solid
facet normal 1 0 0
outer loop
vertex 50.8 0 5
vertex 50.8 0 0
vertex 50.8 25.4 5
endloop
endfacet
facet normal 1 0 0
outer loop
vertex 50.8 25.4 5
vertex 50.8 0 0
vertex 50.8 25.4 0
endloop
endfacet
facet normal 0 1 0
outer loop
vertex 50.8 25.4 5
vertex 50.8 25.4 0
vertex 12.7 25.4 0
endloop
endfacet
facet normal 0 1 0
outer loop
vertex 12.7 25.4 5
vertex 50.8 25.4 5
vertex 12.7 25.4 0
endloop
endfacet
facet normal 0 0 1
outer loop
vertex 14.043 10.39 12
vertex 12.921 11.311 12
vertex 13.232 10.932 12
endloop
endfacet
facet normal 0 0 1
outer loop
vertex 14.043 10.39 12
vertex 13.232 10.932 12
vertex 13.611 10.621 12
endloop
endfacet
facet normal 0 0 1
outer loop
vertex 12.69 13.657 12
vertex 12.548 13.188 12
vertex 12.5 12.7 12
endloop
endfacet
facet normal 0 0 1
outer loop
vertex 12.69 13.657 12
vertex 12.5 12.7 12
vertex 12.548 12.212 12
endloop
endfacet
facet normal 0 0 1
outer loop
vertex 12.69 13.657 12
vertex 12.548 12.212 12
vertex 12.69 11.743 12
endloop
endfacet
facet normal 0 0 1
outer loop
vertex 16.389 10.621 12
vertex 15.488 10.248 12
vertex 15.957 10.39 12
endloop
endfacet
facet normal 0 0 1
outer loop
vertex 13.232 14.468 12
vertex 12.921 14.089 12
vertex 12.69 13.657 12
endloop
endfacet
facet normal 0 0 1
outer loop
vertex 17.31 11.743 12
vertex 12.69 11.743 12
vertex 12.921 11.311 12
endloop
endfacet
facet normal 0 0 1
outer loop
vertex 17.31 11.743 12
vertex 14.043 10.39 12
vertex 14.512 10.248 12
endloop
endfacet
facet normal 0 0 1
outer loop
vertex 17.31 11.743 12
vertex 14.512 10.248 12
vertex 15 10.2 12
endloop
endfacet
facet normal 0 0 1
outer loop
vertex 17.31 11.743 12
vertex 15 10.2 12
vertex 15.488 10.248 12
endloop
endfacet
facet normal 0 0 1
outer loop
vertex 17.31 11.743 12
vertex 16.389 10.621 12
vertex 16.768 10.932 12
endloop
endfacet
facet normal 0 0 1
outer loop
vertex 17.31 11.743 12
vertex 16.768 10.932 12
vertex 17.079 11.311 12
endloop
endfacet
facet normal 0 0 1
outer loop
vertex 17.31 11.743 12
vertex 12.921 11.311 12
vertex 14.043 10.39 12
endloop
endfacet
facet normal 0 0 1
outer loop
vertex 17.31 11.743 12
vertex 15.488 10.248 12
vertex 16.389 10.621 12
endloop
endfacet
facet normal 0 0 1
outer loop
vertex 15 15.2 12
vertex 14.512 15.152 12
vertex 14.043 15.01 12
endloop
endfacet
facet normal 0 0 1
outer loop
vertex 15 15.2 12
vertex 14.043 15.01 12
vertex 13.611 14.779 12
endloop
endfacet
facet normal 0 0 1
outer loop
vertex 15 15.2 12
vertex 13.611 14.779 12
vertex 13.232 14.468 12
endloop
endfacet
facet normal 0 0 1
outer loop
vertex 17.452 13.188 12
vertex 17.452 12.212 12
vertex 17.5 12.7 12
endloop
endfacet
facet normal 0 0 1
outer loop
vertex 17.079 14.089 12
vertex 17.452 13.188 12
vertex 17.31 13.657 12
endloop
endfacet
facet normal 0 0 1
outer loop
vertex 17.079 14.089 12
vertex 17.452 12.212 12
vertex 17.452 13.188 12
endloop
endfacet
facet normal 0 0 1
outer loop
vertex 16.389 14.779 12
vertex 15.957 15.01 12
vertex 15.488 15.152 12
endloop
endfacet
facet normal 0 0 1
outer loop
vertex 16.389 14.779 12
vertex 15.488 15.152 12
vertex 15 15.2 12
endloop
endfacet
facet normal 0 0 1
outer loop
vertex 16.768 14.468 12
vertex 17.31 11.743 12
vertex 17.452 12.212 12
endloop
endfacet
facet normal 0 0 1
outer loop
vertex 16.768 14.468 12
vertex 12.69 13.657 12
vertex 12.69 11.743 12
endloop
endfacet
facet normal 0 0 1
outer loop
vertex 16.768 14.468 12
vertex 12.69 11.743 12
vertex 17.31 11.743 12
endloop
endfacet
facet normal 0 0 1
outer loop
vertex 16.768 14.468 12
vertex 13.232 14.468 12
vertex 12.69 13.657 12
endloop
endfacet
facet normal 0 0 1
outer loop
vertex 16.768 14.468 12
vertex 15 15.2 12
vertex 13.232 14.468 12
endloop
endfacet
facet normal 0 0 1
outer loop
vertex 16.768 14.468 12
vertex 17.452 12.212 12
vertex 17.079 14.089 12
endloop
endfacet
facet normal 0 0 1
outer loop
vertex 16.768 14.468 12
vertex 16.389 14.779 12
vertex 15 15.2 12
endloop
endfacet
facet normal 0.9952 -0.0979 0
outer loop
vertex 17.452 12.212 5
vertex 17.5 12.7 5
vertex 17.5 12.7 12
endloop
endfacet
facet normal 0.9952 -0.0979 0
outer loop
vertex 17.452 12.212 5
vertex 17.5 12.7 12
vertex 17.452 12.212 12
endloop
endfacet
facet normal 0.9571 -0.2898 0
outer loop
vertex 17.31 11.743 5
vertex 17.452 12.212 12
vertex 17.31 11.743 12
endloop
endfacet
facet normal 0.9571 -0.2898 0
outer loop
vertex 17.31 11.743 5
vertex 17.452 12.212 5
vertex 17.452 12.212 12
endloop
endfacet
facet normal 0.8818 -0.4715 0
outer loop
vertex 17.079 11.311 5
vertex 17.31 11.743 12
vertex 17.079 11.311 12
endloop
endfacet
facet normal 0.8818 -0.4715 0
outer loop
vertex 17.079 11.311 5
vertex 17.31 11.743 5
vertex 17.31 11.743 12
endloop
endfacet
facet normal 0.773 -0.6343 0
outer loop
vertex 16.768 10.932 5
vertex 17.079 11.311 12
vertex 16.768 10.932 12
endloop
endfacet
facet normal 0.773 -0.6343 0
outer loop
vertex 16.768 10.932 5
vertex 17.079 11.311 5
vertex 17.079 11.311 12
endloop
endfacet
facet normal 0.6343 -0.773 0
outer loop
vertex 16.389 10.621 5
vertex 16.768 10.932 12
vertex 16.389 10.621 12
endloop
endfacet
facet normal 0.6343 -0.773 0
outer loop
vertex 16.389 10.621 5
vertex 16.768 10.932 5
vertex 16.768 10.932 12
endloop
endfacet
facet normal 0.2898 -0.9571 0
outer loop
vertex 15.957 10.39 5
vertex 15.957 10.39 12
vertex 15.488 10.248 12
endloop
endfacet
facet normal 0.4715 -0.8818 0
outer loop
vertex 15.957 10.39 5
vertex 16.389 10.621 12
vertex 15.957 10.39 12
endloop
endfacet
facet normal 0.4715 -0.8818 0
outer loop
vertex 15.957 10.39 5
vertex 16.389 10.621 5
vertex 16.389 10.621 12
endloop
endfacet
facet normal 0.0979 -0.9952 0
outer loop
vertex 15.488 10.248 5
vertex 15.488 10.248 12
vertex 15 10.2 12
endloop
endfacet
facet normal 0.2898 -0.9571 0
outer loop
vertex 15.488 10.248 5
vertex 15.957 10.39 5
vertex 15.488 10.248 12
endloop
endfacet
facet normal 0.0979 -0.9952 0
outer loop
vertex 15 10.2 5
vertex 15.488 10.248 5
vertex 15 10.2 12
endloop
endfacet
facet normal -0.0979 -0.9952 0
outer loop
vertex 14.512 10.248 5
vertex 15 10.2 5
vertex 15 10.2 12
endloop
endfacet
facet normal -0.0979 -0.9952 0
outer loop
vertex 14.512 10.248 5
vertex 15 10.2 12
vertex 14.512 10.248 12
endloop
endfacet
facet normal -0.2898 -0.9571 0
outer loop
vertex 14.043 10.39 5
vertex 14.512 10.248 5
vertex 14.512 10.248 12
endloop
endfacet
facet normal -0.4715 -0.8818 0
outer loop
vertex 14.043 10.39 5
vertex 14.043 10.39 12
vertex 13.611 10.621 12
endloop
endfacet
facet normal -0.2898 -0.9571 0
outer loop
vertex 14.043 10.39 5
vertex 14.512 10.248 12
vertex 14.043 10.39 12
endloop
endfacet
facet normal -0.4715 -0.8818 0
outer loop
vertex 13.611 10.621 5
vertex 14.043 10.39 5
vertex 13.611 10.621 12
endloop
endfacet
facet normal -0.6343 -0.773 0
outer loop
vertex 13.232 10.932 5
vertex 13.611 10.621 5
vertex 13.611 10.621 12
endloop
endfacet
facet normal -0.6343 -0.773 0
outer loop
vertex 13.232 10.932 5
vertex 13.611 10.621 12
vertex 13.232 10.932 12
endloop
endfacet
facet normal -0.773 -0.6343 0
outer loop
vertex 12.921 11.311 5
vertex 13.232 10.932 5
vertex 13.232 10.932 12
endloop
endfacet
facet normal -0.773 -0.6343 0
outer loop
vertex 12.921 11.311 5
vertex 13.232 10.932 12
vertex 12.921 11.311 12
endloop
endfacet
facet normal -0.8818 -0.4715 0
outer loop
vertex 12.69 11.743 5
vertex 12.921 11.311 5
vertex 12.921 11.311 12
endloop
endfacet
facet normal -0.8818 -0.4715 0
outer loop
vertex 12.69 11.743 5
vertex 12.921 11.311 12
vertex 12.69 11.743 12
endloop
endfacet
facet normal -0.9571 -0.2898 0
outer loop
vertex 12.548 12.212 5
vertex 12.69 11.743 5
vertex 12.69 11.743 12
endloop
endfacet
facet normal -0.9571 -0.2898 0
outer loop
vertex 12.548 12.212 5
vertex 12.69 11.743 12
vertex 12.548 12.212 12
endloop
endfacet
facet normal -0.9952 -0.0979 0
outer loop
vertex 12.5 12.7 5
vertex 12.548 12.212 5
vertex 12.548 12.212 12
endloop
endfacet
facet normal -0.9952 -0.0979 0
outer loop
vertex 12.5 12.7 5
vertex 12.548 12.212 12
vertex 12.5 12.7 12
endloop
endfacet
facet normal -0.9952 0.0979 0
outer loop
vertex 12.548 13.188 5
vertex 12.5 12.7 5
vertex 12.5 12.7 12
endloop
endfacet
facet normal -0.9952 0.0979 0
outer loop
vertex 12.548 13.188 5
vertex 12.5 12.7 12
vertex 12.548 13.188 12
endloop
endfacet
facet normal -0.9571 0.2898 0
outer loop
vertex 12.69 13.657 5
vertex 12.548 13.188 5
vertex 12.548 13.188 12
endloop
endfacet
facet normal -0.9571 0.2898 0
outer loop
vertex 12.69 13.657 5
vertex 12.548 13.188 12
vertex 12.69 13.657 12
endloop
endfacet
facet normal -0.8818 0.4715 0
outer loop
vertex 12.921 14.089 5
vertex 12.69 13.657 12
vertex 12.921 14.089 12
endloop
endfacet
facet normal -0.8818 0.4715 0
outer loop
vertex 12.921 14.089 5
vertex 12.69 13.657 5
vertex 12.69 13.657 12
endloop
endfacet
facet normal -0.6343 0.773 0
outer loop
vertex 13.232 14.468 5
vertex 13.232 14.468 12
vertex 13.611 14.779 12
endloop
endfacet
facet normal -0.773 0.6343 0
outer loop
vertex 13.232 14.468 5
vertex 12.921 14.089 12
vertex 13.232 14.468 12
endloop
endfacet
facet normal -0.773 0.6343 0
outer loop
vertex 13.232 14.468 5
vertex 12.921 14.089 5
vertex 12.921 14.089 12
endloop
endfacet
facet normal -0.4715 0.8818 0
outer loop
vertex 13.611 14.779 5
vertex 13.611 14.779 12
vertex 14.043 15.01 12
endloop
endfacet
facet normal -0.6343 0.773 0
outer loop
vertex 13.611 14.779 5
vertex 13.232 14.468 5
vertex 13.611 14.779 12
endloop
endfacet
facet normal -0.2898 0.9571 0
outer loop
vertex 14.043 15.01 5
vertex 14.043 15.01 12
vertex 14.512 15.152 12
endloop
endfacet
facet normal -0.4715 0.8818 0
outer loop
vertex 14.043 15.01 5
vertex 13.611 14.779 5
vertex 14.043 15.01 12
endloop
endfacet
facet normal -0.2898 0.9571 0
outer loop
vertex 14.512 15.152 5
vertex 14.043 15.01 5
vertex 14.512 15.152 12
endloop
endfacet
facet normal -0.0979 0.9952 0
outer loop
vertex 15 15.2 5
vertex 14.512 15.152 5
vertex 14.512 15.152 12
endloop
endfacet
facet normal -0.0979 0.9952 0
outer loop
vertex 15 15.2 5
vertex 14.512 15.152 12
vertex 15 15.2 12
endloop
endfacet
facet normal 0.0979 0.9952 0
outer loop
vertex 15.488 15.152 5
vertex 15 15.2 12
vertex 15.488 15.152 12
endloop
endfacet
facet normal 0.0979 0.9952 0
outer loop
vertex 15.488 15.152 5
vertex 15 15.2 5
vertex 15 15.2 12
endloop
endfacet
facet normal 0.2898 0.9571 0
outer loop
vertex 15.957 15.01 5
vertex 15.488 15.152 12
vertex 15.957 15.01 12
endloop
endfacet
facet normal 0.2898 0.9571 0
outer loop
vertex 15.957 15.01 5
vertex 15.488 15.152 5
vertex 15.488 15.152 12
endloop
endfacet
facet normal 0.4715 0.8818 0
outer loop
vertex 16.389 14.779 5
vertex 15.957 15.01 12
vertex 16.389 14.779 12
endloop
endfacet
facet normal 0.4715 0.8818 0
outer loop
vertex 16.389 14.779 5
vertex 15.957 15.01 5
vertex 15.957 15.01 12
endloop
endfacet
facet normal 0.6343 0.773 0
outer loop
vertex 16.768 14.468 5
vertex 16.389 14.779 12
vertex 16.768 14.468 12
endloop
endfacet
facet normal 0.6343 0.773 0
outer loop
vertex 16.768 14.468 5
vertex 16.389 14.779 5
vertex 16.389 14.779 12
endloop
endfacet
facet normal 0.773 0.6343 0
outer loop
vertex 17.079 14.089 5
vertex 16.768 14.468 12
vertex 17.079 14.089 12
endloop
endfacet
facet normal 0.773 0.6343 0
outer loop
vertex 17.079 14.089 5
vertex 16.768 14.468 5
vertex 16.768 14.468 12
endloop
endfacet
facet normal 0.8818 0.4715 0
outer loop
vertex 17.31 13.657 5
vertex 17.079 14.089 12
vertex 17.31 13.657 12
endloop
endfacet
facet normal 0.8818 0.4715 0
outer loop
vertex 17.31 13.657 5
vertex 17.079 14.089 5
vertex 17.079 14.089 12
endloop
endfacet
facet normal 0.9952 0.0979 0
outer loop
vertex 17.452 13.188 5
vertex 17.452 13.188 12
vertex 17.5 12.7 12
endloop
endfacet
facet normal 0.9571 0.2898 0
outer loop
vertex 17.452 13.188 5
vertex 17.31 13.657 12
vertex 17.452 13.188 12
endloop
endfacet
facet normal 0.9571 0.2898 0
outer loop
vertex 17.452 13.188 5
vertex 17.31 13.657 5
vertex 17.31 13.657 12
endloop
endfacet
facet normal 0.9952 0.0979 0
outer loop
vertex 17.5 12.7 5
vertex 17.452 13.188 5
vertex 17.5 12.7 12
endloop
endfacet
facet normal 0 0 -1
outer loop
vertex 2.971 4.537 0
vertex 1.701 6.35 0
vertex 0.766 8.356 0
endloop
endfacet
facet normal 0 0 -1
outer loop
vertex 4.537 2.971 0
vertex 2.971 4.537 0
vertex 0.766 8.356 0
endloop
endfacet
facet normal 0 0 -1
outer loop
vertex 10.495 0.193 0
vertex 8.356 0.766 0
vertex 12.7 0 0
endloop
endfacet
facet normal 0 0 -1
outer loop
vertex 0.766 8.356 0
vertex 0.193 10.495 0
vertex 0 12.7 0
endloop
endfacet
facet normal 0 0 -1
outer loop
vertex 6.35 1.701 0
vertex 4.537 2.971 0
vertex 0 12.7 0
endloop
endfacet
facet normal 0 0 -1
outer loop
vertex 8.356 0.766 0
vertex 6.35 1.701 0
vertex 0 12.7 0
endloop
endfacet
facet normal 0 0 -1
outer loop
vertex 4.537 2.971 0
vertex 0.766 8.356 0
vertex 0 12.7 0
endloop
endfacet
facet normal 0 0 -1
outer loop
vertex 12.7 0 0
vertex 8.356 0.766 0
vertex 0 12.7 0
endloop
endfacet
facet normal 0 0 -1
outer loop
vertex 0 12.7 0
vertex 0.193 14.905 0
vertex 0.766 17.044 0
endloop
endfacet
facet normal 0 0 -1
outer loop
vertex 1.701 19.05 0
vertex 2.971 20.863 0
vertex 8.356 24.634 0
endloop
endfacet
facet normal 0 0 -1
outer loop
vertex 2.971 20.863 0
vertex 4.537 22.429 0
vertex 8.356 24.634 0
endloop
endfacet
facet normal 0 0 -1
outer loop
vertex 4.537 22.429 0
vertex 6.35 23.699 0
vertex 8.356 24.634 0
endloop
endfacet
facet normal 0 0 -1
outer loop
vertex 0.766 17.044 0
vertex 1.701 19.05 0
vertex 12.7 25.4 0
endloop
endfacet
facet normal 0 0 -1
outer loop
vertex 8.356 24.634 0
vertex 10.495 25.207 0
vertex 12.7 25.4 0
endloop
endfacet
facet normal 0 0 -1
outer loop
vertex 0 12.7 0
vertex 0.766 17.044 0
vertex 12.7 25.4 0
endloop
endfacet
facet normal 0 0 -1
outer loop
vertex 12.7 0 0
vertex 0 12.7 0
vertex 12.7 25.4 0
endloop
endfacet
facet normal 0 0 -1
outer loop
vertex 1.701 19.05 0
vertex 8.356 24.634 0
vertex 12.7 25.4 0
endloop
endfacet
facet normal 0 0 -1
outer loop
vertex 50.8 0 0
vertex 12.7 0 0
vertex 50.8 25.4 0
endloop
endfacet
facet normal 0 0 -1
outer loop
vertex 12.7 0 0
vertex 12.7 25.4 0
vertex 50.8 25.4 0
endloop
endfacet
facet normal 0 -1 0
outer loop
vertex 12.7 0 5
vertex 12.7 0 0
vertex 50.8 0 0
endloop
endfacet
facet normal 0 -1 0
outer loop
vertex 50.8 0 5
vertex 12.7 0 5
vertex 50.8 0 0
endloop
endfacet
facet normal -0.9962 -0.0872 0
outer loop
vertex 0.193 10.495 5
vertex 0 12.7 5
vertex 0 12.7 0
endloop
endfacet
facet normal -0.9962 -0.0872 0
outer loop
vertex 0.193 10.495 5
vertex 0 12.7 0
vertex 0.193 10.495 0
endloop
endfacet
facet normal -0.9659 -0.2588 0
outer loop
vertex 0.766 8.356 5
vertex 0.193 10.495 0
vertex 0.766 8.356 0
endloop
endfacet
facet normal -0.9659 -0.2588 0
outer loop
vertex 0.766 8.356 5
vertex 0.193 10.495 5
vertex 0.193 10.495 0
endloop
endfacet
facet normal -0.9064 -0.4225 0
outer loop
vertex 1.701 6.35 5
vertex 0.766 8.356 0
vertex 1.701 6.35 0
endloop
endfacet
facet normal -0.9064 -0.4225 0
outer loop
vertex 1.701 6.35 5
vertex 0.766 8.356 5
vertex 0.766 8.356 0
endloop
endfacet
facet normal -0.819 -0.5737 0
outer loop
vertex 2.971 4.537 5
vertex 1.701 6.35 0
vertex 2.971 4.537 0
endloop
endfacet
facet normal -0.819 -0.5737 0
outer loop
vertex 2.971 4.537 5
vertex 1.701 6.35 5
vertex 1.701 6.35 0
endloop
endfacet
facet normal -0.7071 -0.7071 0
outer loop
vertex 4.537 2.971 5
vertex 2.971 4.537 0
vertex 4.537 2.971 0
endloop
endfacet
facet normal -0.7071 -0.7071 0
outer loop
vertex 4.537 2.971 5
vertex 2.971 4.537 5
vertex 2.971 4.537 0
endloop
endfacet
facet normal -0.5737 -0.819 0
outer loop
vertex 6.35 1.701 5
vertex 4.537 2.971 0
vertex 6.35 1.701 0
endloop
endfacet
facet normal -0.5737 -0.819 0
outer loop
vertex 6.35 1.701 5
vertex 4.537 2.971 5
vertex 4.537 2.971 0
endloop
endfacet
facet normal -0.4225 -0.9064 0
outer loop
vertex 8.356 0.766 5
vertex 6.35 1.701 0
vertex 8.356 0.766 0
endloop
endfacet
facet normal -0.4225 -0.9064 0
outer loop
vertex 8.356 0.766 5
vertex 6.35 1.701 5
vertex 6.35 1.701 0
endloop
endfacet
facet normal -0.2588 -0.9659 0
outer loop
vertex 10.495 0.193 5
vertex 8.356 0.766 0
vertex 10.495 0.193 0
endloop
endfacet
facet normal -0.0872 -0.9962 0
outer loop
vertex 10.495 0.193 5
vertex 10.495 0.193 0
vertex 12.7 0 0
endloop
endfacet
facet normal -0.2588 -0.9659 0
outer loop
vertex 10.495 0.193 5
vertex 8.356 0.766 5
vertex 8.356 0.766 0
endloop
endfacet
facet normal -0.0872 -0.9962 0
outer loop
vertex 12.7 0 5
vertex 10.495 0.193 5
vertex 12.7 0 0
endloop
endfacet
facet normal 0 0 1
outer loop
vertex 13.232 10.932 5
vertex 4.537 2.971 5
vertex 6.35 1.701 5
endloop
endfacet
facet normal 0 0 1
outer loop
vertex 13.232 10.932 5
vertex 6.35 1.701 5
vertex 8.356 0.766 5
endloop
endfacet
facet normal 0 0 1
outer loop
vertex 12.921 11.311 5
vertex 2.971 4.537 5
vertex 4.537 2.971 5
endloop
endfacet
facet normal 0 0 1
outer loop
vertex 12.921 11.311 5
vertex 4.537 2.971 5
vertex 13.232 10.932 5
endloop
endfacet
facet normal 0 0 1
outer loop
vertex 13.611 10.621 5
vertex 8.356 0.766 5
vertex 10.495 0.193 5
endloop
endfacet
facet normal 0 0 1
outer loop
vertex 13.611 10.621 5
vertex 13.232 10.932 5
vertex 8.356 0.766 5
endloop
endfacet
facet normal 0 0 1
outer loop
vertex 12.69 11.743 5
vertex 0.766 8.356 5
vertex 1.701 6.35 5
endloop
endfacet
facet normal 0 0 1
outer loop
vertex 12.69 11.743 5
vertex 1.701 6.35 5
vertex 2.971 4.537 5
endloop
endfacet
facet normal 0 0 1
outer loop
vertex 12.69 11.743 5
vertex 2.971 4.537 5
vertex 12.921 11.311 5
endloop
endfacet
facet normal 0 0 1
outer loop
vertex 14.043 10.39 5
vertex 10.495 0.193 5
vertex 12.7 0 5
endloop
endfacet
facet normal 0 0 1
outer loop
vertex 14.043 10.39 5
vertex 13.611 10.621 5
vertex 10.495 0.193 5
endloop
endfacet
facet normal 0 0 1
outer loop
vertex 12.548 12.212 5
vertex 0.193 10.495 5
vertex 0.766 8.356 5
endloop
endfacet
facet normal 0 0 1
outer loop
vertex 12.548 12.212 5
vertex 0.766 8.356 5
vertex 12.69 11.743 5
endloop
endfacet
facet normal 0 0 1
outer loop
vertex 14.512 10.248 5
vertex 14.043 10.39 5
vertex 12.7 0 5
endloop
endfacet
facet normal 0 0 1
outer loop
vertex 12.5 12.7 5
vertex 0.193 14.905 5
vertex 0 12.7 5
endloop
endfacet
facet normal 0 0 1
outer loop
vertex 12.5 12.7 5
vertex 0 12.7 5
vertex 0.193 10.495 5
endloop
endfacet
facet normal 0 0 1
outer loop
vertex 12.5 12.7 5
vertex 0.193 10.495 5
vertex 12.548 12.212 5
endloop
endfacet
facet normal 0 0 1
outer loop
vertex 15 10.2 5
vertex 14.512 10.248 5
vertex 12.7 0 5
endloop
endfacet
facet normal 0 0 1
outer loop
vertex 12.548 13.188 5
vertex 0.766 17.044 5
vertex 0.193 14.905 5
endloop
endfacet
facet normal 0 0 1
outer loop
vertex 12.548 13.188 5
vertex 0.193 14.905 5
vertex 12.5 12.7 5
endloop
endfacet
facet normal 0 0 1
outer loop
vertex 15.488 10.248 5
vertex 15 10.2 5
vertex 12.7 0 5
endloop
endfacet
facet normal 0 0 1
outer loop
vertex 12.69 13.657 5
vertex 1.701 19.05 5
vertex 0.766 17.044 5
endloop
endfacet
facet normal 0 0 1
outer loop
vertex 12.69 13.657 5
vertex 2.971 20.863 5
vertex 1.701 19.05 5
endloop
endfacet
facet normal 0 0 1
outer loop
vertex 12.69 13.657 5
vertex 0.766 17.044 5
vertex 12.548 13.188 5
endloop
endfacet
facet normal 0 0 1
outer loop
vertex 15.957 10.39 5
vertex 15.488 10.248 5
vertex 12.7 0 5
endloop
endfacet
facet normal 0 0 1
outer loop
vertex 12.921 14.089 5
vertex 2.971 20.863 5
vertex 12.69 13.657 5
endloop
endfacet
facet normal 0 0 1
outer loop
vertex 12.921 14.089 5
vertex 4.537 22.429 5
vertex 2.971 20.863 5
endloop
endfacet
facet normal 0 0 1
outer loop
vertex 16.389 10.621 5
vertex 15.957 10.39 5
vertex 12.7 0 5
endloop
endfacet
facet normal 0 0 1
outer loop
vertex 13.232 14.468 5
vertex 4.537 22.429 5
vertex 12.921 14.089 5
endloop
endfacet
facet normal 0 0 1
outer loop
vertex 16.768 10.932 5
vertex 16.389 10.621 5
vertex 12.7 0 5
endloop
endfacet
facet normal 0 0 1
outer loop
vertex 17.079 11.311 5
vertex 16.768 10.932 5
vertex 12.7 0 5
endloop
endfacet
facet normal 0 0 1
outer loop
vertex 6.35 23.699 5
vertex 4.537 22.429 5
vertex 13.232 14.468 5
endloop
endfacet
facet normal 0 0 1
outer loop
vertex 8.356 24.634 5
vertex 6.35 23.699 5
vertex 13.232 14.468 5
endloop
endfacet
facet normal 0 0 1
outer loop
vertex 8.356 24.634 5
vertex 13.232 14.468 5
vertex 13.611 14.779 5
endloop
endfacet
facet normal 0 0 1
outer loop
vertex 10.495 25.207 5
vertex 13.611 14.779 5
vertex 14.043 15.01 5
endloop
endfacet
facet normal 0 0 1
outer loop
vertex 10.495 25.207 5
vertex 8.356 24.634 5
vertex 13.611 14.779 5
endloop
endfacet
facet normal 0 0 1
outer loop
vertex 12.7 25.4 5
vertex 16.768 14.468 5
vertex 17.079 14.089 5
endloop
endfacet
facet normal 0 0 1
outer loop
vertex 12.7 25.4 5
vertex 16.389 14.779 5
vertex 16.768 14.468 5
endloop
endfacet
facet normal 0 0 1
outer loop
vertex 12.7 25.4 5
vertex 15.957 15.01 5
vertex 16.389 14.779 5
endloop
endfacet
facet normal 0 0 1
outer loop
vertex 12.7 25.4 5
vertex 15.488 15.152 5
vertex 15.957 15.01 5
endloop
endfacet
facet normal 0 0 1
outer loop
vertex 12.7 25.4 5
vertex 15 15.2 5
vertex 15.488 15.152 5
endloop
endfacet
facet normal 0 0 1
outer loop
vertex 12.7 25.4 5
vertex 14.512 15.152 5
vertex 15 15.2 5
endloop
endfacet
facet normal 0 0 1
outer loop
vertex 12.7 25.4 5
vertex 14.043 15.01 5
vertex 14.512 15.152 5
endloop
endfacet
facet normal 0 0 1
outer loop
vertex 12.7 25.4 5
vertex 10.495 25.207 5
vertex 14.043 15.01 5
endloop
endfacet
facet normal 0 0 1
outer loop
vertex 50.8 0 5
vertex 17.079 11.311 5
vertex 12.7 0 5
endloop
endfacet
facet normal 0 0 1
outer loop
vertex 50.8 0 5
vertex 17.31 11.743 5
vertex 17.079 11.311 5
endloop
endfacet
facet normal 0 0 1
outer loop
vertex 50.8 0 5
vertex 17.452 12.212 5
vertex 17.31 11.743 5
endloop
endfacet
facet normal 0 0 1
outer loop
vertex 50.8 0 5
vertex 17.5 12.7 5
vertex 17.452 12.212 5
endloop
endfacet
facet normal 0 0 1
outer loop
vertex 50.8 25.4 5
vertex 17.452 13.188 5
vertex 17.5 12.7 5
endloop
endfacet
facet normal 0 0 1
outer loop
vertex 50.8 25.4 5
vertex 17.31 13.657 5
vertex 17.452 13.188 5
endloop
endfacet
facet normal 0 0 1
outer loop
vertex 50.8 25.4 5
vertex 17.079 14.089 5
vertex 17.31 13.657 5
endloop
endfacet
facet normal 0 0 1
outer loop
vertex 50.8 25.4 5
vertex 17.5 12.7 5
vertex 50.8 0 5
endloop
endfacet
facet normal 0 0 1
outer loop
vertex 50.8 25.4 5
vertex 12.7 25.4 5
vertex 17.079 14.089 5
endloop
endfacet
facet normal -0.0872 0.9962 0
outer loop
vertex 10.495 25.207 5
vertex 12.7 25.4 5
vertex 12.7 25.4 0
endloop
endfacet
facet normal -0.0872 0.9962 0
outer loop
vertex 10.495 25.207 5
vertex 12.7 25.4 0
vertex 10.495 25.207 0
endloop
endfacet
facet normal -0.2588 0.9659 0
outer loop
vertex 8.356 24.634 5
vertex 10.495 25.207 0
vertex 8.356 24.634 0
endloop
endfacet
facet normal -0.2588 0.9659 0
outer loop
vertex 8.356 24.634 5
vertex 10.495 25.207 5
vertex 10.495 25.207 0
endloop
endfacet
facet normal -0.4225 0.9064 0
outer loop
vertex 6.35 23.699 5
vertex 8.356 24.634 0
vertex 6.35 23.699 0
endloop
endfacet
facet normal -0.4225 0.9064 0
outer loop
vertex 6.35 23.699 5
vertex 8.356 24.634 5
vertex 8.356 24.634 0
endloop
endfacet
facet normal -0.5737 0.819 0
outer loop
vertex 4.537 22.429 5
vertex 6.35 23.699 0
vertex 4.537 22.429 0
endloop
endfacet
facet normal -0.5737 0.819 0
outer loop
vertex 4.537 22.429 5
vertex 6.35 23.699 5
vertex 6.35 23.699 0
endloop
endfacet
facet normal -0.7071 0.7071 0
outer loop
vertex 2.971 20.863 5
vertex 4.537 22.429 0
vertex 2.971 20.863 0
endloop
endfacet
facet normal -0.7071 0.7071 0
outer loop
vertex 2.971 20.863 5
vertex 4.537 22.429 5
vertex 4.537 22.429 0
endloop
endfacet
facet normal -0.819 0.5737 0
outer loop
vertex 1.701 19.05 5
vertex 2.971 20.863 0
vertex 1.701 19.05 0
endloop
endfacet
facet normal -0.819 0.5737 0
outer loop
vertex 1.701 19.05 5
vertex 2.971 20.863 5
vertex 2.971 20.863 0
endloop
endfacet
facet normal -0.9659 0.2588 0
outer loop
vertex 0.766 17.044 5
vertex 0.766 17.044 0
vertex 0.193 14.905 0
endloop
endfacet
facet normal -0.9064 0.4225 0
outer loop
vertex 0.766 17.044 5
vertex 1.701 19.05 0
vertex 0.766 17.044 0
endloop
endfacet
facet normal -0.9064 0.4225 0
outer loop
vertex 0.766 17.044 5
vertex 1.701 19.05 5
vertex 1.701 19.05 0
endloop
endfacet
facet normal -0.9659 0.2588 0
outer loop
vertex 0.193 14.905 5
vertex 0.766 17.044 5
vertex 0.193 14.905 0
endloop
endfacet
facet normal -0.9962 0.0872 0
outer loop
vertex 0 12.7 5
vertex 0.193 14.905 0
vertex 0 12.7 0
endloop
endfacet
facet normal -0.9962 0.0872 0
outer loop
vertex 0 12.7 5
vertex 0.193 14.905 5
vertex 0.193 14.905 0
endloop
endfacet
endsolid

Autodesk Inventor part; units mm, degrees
ref_plane "YZ Plane" through (0, 0, 0) normal (1, 0, 0) x (0, 1, 0)
ref_plane "XZ Plane" through (0, 0, 0) normal (0, 1, 0) x (-1, 0, 0)
ref_plane "XY Plane" through (0, 0, 0) normal (0, 0, 1) x (1, 0, 0)
sketch "Sketch1" plane through (0, 0, 0) normal (0, 0, 1) x (1, 0, 0)
  line L0 (0, 0) -> (50.8, 0)
  line L1 (50.8, 0) -> (50.8, 25.4)
  line L2 (50.8, 25.4) -> (0, 25.4)
  line L3 (0, 25.4) -> (0, 0)
  dimension "d0" = 50.8
  dimension "d1" = 25.4
extrude "Extrusion1" add sketch "Sketch1" along normal blind 5
sketch "Sketch2" plane through (0, 0, 5) normal (0, 0, 1) x (1, 0, 0)
  circle A0 centre (15, 12.7) radius 2.5
  line L0 (0, 25.4) -> (0, 0) projected
  line L1 (50.8, 0) -> (50.8, 25.4) projected
  point P0 (50.8, 12.7)
  dimension "d4" = 5
  dimension "d5" = 15
extrude "Extrusion2" add sketch "Sketch2" along normal blind 7
full round fillet "Fillet1" first side at (16.9333, 0, 1.6667) centre faces at (0, 16.9333, 3.3333) second side at (33.8667, 25.4, 1.6667)
properties part number "Tilt_Camera_Side_Plate_2"
